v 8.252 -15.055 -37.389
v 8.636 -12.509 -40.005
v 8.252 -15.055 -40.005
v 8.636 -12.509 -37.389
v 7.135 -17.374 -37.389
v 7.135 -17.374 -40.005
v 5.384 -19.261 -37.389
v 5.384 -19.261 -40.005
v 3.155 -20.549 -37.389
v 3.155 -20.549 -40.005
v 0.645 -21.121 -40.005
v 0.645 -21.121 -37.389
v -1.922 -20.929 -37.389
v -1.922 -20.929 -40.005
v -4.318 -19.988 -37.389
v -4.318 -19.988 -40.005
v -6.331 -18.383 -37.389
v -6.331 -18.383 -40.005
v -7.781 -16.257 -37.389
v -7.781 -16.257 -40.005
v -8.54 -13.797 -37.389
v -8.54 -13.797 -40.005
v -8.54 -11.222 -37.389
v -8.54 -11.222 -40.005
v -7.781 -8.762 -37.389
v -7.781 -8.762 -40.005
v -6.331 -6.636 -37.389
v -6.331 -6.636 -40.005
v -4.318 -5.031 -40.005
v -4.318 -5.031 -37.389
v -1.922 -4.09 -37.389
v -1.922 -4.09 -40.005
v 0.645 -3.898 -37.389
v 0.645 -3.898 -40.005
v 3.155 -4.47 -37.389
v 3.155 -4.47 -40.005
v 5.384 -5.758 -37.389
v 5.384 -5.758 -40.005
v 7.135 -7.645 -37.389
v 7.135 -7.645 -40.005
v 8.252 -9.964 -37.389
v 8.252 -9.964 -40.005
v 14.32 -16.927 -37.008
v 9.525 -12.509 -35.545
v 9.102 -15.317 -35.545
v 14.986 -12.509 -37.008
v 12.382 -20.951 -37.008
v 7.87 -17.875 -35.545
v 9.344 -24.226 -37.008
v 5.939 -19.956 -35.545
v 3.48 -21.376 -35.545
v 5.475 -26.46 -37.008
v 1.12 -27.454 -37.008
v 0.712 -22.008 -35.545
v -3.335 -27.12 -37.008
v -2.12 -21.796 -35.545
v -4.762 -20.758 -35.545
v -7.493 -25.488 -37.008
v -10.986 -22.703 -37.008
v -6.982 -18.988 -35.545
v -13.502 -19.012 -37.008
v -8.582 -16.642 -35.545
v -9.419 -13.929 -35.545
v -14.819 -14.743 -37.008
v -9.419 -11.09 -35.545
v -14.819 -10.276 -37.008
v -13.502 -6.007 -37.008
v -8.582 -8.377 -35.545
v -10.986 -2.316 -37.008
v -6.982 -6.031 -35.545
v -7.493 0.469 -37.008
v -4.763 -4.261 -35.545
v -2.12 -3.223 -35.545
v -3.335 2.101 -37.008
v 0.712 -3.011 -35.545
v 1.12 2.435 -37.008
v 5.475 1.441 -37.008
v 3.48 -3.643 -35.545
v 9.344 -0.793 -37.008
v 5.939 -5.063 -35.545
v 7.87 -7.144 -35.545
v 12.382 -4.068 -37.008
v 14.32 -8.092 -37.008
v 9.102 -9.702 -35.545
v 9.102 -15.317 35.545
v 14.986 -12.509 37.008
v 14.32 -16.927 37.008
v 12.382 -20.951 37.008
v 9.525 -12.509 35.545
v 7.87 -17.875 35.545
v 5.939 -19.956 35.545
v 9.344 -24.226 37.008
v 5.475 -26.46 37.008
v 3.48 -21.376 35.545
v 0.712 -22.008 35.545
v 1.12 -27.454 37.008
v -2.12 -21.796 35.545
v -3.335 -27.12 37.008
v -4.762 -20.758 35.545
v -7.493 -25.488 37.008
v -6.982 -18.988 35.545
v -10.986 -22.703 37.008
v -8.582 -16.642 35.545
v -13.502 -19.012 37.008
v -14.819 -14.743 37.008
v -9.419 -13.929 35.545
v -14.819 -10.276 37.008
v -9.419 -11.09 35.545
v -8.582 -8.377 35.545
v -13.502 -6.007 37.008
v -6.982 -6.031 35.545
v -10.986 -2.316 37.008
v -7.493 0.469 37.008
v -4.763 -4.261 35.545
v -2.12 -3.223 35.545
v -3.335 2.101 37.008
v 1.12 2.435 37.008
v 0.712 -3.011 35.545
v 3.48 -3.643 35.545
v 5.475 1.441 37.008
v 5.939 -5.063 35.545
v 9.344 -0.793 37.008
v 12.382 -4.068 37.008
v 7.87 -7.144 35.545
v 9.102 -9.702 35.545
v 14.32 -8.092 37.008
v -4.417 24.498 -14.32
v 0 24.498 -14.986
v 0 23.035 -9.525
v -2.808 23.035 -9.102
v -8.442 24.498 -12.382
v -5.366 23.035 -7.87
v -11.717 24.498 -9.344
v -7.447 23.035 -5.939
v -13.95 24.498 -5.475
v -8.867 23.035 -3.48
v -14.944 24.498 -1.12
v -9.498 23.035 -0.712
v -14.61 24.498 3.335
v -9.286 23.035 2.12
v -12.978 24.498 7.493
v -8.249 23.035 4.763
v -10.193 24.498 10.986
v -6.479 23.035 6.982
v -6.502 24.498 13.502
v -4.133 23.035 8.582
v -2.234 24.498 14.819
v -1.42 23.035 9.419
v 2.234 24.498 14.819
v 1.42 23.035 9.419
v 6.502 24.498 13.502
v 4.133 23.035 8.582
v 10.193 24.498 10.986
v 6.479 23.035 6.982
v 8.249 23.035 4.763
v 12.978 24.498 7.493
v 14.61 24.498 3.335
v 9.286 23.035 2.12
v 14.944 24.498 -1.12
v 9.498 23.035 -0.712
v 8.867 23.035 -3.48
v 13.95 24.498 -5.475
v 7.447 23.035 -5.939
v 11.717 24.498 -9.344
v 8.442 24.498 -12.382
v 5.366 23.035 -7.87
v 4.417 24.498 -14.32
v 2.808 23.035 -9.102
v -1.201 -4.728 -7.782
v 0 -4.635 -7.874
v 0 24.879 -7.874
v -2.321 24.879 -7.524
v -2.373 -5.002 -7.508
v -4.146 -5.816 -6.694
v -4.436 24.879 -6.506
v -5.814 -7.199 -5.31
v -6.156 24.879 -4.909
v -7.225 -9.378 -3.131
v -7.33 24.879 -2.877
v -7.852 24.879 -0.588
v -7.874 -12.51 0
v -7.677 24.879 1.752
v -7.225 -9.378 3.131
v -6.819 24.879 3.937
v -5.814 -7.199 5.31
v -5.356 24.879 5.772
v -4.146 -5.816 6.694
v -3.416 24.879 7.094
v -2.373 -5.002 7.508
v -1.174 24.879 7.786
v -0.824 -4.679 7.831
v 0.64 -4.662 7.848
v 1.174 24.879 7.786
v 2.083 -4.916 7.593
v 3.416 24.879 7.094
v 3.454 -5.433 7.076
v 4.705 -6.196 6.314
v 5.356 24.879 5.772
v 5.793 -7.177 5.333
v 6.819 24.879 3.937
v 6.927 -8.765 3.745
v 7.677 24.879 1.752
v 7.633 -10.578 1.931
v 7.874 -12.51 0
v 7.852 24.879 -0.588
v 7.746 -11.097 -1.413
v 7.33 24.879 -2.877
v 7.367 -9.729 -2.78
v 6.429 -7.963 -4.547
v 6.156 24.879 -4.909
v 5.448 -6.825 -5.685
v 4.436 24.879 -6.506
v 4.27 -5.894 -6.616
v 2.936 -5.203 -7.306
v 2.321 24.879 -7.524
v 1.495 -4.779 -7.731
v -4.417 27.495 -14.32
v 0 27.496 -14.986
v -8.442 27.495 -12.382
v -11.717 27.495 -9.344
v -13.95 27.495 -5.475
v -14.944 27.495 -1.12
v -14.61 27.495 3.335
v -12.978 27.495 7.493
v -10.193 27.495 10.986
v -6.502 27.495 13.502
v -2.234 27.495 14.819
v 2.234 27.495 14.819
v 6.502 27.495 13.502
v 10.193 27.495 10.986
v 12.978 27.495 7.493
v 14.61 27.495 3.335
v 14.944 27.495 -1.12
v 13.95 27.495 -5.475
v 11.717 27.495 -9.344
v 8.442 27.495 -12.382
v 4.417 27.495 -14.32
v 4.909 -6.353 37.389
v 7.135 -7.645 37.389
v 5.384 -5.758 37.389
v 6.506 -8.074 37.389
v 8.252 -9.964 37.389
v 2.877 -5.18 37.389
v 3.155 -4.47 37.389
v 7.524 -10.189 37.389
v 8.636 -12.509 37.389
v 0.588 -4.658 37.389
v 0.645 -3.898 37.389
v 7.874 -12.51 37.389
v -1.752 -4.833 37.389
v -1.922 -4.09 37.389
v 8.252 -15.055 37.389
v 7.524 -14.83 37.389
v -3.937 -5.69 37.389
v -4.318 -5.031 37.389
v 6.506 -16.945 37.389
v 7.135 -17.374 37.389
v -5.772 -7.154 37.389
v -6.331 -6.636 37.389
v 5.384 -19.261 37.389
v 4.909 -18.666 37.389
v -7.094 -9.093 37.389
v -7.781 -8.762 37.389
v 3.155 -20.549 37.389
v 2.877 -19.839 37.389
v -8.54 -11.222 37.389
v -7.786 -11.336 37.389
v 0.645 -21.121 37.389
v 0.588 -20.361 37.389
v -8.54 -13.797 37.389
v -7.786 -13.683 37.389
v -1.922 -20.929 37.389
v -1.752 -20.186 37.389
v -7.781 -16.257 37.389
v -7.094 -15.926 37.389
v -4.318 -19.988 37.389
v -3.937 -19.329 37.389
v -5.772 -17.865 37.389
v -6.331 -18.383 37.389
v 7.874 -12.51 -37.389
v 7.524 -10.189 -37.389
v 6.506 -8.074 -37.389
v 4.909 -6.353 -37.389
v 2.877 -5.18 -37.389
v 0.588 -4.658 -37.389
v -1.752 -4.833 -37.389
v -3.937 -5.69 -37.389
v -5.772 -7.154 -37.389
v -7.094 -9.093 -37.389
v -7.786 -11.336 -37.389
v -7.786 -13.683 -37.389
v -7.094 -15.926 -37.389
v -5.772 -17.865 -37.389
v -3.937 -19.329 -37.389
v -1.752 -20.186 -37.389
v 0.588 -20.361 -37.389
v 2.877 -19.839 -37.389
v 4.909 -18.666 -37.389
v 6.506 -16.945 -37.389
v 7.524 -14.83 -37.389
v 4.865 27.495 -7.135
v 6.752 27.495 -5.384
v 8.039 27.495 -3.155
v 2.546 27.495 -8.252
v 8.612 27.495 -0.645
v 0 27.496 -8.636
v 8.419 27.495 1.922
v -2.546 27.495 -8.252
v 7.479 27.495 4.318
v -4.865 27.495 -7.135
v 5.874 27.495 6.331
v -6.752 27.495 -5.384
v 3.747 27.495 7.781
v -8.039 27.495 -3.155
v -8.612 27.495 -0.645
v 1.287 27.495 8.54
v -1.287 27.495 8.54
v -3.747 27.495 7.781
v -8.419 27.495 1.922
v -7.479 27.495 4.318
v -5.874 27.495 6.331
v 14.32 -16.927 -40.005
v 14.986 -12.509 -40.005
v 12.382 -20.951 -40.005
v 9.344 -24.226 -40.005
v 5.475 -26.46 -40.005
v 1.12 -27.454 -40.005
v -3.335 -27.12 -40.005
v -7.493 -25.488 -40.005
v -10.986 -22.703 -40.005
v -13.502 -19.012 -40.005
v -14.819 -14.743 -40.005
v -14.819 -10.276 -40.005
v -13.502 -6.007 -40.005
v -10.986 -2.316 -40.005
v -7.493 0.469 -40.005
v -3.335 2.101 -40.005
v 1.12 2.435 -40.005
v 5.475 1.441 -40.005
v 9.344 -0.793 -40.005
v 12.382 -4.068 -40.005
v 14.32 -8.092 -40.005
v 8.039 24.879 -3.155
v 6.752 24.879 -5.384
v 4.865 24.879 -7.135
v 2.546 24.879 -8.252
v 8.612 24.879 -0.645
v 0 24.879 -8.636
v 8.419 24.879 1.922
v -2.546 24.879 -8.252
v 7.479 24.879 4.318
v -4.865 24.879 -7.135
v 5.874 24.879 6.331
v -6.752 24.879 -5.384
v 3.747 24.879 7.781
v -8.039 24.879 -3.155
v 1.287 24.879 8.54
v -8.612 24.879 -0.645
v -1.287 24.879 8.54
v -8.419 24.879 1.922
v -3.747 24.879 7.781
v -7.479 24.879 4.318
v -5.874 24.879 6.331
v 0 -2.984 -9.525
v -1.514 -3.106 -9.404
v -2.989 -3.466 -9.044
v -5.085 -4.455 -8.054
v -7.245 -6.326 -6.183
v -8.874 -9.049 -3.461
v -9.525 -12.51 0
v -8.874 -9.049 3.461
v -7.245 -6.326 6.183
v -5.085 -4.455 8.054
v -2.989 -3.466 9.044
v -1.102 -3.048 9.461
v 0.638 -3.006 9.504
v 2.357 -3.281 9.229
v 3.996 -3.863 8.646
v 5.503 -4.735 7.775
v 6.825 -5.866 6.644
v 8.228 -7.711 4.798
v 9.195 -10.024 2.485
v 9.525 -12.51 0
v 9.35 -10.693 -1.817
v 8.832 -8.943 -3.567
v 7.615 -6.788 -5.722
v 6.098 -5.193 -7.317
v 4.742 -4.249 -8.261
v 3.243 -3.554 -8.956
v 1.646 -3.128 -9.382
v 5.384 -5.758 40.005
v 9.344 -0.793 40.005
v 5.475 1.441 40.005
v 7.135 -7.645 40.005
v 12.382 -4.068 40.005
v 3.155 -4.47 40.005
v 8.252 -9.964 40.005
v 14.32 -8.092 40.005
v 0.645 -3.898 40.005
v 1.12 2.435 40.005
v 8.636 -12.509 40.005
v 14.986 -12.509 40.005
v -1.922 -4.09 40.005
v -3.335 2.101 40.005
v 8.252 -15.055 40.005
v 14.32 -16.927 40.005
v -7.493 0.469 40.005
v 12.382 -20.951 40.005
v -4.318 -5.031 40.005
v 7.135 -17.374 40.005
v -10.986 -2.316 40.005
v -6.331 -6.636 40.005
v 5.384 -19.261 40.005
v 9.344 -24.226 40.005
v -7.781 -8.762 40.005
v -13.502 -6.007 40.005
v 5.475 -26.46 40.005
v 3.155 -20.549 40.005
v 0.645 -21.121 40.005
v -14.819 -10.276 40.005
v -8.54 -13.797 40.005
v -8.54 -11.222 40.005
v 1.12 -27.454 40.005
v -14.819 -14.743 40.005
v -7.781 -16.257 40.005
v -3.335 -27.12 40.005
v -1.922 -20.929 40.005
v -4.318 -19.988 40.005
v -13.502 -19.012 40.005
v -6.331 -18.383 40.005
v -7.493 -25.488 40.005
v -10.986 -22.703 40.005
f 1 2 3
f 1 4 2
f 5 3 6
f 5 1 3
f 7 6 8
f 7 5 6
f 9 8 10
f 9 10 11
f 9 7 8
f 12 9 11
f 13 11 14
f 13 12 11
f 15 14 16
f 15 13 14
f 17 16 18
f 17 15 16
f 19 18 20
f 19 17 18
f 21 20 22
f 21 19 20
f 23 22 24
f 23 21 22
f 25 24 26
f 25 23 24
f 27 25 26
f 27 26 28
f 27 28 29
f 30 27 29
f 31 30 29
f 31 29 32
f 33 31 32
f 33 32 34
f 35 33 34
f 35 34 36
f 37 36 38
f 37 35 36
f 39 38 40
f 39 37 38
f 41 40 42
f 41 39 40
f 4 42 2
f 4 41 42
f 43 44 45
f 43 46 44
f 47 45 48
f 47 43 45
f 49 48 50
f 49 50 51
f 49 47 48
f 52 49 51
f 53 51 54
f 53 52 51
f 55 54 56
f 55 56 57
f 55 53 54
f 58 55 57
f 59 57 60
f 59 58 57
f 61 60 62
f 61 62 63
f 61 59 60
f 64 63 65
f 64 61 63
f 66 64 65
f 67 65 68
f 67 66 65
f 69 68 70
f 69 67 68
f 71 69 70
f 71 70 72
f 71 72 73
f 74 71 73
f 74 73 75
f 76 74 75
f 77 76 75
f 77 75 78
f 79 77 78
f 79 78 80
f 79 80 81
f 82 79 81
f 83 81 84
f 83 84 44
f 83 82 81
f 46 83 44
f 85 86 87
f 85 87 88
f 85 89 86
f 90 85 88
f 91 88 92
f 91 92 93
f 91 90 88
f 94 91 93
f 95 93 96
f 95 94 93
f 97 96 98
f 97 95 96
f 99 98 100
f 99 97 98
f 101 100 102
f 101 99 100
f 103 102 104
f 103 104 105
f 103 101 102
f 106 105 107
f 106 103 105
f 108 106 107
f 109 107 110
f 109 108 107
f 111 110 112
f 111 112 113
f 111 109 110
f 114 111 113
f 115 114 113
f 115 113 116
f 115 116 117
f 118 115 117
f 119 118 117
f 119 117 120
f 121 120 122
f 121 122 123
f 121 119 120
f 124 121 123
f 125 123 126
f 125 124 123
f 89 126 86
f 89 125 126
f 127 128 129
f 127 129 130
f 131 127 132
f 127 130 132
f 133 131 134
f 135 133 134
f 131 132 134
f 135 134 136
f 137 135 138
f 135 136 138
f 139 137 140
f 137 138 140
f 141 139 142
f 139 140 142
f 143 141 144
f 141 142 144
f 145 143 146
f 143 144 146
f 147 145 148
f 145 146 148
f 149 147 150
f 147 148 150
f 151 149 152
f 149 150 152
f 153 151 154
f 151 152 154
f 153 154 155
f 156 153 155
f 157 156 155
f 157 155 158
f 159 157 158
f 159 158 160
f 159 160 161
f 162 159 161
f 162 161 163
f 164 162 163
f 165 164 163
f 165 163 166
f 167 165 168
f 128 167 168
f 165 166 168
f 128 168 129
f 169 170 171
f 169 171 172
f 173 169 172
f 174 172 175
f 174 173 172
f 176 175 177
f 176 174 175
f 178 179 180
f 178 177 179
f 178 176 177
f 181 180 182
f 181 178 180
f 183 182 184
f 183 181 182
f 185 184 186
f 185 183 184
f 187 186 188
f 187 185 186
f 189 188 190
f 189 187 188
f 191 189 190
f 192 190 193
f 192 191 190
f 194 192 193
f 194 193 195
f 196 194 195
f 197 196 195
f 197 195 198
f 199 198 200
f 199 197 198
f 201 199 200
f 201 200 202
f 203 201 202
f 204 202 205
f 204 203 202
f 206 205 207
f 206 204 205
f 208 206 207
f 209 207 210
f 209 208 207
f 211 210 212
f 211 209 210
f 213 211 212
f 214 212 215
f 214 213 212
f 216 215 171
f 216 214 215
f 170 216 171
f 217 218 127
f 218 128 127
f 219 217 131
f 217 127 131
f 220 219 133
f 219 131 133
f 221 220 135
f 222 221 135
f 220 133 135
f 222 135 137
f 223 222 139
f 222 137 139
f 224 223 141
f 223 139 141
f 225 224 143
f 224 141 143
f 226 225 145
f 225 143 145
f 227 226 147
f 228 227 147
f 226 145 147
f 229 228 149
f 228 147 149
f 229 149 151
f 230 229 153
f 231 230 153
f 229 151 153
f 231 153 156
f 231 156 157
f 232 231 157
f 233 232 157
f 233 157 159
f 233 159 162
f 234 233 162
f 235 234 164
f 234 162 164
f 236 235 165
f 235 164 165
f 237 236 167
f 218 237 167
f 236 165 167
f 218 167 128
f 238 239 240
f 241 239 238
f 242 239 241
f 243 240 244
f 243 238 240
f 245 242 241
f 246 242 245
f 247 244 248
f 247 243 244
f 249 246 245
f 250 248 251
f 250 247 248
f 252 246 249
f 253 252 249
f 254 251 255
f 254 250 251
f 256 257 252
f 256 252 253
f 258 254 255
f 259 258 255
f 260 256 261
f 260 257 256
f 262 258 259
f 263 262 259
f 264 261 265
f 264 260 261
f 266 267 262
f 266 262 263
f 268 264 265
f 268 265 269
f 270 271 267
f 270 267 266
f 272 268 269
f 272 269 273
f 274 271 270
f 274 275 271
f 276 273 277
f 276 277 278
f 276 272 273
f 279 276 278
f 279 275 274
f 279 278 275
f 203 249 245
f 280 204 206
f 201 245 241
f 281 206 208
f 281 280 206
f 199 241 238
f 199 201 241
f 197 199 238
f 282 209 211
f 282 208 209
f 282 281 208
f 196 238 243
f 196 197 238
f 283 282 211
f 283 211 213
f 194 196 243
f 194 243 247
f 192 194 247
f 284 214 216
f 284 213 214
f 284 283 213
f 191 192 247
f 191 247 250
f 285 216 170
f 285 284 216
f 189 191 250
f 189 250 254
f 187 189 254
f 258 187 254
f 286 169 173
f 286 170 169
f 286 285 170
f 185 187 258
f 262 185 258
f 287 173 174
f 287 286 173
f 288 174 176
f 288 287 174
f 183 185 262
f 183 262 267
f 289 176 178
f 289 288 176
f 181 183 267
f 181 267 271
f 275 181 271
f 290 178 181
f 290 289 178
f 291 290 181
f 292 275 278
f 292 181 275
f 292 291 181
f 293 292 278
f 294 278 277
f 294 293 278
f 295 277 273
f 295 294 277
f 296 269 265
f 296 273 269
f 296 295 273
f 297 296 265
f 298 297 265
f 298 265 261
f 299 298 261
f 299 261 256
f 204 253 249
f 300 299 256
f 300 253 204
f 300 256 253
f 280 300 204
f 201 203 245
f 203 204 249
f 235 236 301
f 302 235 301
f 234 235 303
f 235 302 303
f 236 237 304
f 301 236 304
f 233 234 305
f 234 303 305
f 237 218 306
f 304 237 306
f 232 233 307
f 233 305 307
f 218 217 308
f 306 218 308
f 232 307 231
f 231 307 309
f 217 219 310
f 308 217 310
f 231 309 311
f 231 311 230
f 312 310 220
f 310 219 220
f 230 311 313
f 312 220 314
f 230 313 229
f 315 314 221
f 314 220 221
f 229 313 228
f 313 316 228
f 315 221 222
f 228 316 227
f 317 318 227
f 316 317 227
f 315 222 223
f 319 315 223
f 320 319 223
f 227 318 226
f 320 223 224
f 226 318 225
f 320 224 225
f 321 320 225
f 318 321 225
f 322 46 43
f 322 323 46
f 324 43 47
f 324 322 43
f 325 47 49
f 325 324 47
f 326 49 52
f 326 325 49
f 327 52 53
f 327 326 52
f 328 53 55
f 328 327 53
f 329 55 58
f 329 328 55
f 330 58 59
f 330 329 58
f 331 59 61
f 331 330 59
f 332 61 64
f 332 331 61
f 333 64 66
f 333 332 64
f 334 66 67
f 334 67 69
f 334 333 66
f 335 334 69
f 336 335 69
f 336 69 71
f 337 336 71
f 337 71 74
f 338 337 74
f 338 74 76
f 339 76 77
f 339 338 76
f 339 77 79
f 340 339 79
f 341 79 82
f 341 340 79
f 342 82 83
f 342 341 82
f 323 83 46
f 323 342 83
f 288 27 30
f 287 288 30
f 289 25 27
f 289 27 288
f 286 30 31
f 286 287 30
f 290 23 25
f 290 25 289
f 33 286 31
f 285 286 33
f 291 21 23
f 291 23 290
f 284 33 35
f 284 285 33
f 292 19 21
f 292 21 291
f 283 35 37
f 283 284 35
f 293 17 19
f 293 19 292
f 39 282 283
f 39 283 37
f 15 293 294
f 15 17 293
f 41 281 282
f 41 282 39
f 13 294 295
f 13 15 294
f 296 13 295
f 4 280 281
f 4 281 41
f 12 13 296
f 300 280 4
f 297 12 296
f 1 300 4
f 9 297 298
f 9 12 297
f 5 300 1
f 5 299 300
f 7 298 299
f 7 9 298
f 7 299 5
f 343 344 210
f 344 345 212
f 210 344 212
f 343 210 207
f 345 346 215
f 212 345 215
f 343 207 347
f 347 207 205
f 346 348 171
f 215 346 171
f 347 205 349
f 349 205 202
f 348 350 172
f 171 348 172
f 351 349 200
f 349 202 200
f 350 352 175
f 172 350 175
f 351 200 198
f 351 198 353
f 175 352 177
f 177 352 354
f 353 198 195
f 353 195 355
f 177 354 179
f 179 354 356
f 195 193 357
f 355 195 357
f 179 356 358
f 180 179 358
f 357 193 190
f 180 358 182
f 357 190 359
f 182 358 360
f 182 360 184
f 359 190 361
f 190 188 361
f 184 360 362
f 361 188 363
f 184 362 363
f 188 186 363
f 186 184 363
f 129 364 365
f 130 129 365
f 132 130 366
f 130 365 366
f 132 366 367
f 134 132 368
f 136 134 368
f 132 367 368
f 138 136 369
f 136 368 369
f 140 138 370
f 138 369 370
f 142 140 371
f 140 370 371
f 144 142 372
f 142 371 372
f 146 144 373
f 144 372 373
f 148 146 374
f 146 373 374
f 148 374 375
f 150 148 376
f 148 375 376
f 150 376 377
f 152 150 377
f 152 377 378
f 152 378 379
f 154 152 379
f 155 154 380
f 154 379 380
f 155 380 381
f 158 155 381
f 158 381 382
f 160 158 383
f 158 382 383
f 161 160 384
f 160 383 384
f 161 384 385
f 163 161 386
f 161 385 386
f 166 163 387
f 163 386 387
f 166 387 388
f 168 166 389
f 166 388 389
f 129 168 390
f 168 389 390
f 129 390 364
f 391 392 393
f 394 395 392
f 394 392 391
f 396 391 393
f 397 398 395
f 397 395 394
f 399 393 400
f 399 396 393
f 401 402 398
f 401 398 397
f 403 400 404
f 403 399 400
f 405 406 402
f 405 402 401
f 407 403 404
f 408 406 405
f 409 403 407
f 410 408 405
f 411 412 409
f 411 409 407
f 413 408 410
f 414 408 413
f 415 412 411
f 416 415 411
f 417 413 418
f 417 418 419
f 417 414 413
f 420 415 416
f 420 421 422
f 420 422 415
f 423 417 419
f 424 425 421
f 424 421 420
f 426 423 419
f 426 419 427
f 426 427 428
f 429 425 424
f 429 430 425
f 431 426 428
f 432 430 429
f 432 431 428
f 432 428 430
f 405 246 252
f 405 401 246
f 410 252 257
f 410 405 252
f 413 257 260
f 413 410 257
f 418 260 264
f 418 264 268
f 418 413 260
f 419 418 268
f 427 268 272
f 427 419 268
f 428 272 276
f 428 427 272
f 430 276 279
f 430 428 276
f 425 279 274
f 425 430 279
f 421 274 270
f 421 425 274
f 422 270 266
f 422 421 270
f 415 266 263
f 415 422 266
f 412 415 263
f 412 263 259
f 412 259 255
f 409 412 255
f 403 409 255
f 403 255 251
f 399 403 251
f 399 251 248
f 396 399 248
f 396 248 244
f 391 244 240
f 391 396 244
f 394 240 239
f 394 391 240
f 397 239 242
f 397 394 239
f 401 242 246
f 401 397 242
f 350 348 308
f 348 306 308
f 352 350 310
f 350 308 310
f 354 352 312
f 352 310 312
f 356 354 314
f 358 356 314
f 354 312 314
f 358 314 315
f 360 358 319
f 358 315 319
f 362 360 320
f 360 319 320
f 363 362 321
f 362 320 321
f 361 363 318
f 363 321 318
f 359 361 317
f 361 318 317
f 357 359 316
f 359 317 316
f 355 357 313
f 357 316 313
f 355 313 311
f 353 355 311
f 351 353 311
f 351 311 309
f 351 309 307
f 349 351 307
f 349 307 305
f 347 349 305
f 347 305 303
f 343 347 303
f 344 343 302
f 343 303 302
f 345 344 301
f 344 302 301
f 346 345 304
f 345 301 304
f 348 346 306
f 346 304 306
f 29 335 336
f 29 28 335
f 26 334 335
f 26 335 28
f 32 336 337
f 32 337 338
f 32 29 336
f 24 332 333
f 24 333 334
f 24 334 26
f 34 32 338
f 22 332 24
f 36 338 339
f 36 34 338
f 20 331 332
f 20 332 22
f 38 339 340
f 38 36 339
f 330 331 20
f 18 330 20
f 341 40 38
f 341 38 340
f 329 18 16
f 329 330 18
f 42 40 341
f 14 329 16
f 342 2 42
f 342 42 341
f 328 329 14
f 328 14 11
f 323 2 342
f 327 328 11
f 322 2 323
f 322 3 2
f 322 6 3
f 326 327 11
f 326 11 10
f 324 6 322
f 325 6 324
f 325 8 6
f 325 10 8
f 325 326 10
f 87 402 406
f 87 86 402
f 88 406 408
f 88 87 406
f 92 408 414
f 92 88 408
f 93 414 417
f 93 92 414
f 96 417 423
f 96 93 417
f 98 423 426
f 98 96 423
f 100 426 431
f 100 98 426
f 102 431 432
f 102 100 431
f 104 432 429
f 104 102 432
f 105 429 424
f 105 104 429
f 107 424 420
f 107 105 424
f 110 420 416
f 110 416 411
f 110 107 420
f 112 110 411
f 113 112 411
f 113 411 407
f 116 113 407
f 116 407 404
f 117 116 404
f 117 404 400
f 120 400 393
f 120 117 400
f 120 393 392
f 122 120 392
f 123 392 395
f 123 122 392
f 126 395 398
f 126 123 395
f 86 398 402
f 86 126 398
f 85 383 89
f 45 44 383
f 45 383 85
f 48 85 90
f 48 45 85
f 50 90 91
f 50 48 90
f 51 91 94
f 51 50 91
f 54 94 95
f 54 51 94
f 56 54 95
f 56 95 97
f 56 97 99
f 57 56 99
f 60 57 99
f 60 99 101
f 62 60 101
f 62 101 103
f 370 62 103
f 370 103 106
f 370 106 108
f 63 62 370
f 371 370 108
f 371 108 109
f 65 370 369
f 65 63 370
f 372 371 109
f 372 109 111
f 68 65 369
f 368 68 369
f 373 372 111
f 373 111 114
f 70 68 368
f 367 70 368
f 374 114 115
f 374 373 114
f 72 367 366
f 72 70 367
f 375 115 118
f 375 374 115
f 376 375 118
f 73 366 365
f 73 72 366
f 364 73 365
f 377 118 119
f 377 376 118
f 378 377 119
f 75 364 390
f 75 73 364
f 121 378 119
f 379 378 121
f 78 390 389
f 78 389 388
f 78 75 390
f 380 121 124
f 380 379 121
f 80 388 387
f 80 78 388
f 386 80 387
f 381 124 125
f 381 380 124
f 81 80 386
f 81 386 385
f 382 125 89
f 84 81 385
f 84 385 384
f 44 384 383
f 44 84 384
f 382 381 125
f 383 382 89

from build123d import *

# Parameters (mm, degrees)
CUT_EXTRUDE1_DEPTH      = 51.803373325
CUT_EXTRUDE1_DEPTH_BACK = 51.803373325
SKETCH4_R               = 7.874
CUT_EXTRUDE2_START      = -12.5095
SKETCH5_R               = 7.874
CUT_EXTRUDE2_DEPTH      = 64.312873325


with BuildPart() as part:
    # Sketch2 → Revolve1 (revolve)
    with BuildSketch(Plane(origin=(0, 0, 0), x_dir=(0, 0, -1), z_dir=(1, 0, 0)), mode=Mode.PRIVATE) as revolve1_sk:
        Polygon((-40.005, 2.4765), (-37.0078, 2.4765), (-35.54452946, -2.9845), (35.54452946, -2.9845), (37.0078, 2.4765), (40.005, 2.4765), (40.005, -3.8735), (37.3888, -3.8735), (37.3888, -12.5095), (-37.3888, -12.5095), (-37.3888, -3.8735), (-40.005, -3.8735), align=None)
    revolve(revolve1_sk.sketch.rotate(Axis((0, -12.5095, 40.005), (0, 0, -1)), 90), axis=Axis((0, -12.5095, 40.005), (0, 0, -1)))

    # Sketch3 → Revolve2 (revolve)
    with BuildSketch(Plane(origin=(0, 0, 0), x_dir=(0, 0, -1), z_dir=(1, 0, 0)), mode=Mode.PRIVATE) as revolve2_sk:
        Polygon((-14.986, 27.4955), (-14.986, 24.4983), (-9.525, 23.03502946), (-9.525, -12.5095), (0, -12.5095), (0, 24.8793), (-8.636, 24.8793), (-8.636, 27.4955), align=None)
    revolve(revolve2_sk.sketch.rotate(Axis((0, -12.5095, 0), (0, 1, 0)), 180), axis=Axis((0, -12.5095, 0), (0, 1, 0)))

    # Sketch4 → Cut-Extrude1 (cut, two sides: drawn at the far end of the back side and taken through both)
    with BuildSketch(Plane.XY.offset(-CUT_EXTRUDE1_DEPTH_BACK)):
        with Locations((0, -12.5095)):
            Circle(SKETCH4_R)
    extrude(amount=CUT_EXTRUDE1_DEPTH + CUT_EXTRUDE1_DEPTH_BACK, mode=Mode.SUBTRACT)

    # Sketch5 → Cut-Extrude2 (cut, through all)
    with BuildSketch(Plane(origin=(0, 0, 0), x_dir=(1, 0, 0), z_dir=(0, 1, 0)).offset(CUT_EXTRUDE2_START)):
        with Locations(Location((0, 0, 0), (0, 0, 90))):
            Circle(SKETCH5_R)
    extrude(amount=CUT_EXTRUDE2_DEPTH, mode=Mode.SUBTRACT)


solid = part.part
